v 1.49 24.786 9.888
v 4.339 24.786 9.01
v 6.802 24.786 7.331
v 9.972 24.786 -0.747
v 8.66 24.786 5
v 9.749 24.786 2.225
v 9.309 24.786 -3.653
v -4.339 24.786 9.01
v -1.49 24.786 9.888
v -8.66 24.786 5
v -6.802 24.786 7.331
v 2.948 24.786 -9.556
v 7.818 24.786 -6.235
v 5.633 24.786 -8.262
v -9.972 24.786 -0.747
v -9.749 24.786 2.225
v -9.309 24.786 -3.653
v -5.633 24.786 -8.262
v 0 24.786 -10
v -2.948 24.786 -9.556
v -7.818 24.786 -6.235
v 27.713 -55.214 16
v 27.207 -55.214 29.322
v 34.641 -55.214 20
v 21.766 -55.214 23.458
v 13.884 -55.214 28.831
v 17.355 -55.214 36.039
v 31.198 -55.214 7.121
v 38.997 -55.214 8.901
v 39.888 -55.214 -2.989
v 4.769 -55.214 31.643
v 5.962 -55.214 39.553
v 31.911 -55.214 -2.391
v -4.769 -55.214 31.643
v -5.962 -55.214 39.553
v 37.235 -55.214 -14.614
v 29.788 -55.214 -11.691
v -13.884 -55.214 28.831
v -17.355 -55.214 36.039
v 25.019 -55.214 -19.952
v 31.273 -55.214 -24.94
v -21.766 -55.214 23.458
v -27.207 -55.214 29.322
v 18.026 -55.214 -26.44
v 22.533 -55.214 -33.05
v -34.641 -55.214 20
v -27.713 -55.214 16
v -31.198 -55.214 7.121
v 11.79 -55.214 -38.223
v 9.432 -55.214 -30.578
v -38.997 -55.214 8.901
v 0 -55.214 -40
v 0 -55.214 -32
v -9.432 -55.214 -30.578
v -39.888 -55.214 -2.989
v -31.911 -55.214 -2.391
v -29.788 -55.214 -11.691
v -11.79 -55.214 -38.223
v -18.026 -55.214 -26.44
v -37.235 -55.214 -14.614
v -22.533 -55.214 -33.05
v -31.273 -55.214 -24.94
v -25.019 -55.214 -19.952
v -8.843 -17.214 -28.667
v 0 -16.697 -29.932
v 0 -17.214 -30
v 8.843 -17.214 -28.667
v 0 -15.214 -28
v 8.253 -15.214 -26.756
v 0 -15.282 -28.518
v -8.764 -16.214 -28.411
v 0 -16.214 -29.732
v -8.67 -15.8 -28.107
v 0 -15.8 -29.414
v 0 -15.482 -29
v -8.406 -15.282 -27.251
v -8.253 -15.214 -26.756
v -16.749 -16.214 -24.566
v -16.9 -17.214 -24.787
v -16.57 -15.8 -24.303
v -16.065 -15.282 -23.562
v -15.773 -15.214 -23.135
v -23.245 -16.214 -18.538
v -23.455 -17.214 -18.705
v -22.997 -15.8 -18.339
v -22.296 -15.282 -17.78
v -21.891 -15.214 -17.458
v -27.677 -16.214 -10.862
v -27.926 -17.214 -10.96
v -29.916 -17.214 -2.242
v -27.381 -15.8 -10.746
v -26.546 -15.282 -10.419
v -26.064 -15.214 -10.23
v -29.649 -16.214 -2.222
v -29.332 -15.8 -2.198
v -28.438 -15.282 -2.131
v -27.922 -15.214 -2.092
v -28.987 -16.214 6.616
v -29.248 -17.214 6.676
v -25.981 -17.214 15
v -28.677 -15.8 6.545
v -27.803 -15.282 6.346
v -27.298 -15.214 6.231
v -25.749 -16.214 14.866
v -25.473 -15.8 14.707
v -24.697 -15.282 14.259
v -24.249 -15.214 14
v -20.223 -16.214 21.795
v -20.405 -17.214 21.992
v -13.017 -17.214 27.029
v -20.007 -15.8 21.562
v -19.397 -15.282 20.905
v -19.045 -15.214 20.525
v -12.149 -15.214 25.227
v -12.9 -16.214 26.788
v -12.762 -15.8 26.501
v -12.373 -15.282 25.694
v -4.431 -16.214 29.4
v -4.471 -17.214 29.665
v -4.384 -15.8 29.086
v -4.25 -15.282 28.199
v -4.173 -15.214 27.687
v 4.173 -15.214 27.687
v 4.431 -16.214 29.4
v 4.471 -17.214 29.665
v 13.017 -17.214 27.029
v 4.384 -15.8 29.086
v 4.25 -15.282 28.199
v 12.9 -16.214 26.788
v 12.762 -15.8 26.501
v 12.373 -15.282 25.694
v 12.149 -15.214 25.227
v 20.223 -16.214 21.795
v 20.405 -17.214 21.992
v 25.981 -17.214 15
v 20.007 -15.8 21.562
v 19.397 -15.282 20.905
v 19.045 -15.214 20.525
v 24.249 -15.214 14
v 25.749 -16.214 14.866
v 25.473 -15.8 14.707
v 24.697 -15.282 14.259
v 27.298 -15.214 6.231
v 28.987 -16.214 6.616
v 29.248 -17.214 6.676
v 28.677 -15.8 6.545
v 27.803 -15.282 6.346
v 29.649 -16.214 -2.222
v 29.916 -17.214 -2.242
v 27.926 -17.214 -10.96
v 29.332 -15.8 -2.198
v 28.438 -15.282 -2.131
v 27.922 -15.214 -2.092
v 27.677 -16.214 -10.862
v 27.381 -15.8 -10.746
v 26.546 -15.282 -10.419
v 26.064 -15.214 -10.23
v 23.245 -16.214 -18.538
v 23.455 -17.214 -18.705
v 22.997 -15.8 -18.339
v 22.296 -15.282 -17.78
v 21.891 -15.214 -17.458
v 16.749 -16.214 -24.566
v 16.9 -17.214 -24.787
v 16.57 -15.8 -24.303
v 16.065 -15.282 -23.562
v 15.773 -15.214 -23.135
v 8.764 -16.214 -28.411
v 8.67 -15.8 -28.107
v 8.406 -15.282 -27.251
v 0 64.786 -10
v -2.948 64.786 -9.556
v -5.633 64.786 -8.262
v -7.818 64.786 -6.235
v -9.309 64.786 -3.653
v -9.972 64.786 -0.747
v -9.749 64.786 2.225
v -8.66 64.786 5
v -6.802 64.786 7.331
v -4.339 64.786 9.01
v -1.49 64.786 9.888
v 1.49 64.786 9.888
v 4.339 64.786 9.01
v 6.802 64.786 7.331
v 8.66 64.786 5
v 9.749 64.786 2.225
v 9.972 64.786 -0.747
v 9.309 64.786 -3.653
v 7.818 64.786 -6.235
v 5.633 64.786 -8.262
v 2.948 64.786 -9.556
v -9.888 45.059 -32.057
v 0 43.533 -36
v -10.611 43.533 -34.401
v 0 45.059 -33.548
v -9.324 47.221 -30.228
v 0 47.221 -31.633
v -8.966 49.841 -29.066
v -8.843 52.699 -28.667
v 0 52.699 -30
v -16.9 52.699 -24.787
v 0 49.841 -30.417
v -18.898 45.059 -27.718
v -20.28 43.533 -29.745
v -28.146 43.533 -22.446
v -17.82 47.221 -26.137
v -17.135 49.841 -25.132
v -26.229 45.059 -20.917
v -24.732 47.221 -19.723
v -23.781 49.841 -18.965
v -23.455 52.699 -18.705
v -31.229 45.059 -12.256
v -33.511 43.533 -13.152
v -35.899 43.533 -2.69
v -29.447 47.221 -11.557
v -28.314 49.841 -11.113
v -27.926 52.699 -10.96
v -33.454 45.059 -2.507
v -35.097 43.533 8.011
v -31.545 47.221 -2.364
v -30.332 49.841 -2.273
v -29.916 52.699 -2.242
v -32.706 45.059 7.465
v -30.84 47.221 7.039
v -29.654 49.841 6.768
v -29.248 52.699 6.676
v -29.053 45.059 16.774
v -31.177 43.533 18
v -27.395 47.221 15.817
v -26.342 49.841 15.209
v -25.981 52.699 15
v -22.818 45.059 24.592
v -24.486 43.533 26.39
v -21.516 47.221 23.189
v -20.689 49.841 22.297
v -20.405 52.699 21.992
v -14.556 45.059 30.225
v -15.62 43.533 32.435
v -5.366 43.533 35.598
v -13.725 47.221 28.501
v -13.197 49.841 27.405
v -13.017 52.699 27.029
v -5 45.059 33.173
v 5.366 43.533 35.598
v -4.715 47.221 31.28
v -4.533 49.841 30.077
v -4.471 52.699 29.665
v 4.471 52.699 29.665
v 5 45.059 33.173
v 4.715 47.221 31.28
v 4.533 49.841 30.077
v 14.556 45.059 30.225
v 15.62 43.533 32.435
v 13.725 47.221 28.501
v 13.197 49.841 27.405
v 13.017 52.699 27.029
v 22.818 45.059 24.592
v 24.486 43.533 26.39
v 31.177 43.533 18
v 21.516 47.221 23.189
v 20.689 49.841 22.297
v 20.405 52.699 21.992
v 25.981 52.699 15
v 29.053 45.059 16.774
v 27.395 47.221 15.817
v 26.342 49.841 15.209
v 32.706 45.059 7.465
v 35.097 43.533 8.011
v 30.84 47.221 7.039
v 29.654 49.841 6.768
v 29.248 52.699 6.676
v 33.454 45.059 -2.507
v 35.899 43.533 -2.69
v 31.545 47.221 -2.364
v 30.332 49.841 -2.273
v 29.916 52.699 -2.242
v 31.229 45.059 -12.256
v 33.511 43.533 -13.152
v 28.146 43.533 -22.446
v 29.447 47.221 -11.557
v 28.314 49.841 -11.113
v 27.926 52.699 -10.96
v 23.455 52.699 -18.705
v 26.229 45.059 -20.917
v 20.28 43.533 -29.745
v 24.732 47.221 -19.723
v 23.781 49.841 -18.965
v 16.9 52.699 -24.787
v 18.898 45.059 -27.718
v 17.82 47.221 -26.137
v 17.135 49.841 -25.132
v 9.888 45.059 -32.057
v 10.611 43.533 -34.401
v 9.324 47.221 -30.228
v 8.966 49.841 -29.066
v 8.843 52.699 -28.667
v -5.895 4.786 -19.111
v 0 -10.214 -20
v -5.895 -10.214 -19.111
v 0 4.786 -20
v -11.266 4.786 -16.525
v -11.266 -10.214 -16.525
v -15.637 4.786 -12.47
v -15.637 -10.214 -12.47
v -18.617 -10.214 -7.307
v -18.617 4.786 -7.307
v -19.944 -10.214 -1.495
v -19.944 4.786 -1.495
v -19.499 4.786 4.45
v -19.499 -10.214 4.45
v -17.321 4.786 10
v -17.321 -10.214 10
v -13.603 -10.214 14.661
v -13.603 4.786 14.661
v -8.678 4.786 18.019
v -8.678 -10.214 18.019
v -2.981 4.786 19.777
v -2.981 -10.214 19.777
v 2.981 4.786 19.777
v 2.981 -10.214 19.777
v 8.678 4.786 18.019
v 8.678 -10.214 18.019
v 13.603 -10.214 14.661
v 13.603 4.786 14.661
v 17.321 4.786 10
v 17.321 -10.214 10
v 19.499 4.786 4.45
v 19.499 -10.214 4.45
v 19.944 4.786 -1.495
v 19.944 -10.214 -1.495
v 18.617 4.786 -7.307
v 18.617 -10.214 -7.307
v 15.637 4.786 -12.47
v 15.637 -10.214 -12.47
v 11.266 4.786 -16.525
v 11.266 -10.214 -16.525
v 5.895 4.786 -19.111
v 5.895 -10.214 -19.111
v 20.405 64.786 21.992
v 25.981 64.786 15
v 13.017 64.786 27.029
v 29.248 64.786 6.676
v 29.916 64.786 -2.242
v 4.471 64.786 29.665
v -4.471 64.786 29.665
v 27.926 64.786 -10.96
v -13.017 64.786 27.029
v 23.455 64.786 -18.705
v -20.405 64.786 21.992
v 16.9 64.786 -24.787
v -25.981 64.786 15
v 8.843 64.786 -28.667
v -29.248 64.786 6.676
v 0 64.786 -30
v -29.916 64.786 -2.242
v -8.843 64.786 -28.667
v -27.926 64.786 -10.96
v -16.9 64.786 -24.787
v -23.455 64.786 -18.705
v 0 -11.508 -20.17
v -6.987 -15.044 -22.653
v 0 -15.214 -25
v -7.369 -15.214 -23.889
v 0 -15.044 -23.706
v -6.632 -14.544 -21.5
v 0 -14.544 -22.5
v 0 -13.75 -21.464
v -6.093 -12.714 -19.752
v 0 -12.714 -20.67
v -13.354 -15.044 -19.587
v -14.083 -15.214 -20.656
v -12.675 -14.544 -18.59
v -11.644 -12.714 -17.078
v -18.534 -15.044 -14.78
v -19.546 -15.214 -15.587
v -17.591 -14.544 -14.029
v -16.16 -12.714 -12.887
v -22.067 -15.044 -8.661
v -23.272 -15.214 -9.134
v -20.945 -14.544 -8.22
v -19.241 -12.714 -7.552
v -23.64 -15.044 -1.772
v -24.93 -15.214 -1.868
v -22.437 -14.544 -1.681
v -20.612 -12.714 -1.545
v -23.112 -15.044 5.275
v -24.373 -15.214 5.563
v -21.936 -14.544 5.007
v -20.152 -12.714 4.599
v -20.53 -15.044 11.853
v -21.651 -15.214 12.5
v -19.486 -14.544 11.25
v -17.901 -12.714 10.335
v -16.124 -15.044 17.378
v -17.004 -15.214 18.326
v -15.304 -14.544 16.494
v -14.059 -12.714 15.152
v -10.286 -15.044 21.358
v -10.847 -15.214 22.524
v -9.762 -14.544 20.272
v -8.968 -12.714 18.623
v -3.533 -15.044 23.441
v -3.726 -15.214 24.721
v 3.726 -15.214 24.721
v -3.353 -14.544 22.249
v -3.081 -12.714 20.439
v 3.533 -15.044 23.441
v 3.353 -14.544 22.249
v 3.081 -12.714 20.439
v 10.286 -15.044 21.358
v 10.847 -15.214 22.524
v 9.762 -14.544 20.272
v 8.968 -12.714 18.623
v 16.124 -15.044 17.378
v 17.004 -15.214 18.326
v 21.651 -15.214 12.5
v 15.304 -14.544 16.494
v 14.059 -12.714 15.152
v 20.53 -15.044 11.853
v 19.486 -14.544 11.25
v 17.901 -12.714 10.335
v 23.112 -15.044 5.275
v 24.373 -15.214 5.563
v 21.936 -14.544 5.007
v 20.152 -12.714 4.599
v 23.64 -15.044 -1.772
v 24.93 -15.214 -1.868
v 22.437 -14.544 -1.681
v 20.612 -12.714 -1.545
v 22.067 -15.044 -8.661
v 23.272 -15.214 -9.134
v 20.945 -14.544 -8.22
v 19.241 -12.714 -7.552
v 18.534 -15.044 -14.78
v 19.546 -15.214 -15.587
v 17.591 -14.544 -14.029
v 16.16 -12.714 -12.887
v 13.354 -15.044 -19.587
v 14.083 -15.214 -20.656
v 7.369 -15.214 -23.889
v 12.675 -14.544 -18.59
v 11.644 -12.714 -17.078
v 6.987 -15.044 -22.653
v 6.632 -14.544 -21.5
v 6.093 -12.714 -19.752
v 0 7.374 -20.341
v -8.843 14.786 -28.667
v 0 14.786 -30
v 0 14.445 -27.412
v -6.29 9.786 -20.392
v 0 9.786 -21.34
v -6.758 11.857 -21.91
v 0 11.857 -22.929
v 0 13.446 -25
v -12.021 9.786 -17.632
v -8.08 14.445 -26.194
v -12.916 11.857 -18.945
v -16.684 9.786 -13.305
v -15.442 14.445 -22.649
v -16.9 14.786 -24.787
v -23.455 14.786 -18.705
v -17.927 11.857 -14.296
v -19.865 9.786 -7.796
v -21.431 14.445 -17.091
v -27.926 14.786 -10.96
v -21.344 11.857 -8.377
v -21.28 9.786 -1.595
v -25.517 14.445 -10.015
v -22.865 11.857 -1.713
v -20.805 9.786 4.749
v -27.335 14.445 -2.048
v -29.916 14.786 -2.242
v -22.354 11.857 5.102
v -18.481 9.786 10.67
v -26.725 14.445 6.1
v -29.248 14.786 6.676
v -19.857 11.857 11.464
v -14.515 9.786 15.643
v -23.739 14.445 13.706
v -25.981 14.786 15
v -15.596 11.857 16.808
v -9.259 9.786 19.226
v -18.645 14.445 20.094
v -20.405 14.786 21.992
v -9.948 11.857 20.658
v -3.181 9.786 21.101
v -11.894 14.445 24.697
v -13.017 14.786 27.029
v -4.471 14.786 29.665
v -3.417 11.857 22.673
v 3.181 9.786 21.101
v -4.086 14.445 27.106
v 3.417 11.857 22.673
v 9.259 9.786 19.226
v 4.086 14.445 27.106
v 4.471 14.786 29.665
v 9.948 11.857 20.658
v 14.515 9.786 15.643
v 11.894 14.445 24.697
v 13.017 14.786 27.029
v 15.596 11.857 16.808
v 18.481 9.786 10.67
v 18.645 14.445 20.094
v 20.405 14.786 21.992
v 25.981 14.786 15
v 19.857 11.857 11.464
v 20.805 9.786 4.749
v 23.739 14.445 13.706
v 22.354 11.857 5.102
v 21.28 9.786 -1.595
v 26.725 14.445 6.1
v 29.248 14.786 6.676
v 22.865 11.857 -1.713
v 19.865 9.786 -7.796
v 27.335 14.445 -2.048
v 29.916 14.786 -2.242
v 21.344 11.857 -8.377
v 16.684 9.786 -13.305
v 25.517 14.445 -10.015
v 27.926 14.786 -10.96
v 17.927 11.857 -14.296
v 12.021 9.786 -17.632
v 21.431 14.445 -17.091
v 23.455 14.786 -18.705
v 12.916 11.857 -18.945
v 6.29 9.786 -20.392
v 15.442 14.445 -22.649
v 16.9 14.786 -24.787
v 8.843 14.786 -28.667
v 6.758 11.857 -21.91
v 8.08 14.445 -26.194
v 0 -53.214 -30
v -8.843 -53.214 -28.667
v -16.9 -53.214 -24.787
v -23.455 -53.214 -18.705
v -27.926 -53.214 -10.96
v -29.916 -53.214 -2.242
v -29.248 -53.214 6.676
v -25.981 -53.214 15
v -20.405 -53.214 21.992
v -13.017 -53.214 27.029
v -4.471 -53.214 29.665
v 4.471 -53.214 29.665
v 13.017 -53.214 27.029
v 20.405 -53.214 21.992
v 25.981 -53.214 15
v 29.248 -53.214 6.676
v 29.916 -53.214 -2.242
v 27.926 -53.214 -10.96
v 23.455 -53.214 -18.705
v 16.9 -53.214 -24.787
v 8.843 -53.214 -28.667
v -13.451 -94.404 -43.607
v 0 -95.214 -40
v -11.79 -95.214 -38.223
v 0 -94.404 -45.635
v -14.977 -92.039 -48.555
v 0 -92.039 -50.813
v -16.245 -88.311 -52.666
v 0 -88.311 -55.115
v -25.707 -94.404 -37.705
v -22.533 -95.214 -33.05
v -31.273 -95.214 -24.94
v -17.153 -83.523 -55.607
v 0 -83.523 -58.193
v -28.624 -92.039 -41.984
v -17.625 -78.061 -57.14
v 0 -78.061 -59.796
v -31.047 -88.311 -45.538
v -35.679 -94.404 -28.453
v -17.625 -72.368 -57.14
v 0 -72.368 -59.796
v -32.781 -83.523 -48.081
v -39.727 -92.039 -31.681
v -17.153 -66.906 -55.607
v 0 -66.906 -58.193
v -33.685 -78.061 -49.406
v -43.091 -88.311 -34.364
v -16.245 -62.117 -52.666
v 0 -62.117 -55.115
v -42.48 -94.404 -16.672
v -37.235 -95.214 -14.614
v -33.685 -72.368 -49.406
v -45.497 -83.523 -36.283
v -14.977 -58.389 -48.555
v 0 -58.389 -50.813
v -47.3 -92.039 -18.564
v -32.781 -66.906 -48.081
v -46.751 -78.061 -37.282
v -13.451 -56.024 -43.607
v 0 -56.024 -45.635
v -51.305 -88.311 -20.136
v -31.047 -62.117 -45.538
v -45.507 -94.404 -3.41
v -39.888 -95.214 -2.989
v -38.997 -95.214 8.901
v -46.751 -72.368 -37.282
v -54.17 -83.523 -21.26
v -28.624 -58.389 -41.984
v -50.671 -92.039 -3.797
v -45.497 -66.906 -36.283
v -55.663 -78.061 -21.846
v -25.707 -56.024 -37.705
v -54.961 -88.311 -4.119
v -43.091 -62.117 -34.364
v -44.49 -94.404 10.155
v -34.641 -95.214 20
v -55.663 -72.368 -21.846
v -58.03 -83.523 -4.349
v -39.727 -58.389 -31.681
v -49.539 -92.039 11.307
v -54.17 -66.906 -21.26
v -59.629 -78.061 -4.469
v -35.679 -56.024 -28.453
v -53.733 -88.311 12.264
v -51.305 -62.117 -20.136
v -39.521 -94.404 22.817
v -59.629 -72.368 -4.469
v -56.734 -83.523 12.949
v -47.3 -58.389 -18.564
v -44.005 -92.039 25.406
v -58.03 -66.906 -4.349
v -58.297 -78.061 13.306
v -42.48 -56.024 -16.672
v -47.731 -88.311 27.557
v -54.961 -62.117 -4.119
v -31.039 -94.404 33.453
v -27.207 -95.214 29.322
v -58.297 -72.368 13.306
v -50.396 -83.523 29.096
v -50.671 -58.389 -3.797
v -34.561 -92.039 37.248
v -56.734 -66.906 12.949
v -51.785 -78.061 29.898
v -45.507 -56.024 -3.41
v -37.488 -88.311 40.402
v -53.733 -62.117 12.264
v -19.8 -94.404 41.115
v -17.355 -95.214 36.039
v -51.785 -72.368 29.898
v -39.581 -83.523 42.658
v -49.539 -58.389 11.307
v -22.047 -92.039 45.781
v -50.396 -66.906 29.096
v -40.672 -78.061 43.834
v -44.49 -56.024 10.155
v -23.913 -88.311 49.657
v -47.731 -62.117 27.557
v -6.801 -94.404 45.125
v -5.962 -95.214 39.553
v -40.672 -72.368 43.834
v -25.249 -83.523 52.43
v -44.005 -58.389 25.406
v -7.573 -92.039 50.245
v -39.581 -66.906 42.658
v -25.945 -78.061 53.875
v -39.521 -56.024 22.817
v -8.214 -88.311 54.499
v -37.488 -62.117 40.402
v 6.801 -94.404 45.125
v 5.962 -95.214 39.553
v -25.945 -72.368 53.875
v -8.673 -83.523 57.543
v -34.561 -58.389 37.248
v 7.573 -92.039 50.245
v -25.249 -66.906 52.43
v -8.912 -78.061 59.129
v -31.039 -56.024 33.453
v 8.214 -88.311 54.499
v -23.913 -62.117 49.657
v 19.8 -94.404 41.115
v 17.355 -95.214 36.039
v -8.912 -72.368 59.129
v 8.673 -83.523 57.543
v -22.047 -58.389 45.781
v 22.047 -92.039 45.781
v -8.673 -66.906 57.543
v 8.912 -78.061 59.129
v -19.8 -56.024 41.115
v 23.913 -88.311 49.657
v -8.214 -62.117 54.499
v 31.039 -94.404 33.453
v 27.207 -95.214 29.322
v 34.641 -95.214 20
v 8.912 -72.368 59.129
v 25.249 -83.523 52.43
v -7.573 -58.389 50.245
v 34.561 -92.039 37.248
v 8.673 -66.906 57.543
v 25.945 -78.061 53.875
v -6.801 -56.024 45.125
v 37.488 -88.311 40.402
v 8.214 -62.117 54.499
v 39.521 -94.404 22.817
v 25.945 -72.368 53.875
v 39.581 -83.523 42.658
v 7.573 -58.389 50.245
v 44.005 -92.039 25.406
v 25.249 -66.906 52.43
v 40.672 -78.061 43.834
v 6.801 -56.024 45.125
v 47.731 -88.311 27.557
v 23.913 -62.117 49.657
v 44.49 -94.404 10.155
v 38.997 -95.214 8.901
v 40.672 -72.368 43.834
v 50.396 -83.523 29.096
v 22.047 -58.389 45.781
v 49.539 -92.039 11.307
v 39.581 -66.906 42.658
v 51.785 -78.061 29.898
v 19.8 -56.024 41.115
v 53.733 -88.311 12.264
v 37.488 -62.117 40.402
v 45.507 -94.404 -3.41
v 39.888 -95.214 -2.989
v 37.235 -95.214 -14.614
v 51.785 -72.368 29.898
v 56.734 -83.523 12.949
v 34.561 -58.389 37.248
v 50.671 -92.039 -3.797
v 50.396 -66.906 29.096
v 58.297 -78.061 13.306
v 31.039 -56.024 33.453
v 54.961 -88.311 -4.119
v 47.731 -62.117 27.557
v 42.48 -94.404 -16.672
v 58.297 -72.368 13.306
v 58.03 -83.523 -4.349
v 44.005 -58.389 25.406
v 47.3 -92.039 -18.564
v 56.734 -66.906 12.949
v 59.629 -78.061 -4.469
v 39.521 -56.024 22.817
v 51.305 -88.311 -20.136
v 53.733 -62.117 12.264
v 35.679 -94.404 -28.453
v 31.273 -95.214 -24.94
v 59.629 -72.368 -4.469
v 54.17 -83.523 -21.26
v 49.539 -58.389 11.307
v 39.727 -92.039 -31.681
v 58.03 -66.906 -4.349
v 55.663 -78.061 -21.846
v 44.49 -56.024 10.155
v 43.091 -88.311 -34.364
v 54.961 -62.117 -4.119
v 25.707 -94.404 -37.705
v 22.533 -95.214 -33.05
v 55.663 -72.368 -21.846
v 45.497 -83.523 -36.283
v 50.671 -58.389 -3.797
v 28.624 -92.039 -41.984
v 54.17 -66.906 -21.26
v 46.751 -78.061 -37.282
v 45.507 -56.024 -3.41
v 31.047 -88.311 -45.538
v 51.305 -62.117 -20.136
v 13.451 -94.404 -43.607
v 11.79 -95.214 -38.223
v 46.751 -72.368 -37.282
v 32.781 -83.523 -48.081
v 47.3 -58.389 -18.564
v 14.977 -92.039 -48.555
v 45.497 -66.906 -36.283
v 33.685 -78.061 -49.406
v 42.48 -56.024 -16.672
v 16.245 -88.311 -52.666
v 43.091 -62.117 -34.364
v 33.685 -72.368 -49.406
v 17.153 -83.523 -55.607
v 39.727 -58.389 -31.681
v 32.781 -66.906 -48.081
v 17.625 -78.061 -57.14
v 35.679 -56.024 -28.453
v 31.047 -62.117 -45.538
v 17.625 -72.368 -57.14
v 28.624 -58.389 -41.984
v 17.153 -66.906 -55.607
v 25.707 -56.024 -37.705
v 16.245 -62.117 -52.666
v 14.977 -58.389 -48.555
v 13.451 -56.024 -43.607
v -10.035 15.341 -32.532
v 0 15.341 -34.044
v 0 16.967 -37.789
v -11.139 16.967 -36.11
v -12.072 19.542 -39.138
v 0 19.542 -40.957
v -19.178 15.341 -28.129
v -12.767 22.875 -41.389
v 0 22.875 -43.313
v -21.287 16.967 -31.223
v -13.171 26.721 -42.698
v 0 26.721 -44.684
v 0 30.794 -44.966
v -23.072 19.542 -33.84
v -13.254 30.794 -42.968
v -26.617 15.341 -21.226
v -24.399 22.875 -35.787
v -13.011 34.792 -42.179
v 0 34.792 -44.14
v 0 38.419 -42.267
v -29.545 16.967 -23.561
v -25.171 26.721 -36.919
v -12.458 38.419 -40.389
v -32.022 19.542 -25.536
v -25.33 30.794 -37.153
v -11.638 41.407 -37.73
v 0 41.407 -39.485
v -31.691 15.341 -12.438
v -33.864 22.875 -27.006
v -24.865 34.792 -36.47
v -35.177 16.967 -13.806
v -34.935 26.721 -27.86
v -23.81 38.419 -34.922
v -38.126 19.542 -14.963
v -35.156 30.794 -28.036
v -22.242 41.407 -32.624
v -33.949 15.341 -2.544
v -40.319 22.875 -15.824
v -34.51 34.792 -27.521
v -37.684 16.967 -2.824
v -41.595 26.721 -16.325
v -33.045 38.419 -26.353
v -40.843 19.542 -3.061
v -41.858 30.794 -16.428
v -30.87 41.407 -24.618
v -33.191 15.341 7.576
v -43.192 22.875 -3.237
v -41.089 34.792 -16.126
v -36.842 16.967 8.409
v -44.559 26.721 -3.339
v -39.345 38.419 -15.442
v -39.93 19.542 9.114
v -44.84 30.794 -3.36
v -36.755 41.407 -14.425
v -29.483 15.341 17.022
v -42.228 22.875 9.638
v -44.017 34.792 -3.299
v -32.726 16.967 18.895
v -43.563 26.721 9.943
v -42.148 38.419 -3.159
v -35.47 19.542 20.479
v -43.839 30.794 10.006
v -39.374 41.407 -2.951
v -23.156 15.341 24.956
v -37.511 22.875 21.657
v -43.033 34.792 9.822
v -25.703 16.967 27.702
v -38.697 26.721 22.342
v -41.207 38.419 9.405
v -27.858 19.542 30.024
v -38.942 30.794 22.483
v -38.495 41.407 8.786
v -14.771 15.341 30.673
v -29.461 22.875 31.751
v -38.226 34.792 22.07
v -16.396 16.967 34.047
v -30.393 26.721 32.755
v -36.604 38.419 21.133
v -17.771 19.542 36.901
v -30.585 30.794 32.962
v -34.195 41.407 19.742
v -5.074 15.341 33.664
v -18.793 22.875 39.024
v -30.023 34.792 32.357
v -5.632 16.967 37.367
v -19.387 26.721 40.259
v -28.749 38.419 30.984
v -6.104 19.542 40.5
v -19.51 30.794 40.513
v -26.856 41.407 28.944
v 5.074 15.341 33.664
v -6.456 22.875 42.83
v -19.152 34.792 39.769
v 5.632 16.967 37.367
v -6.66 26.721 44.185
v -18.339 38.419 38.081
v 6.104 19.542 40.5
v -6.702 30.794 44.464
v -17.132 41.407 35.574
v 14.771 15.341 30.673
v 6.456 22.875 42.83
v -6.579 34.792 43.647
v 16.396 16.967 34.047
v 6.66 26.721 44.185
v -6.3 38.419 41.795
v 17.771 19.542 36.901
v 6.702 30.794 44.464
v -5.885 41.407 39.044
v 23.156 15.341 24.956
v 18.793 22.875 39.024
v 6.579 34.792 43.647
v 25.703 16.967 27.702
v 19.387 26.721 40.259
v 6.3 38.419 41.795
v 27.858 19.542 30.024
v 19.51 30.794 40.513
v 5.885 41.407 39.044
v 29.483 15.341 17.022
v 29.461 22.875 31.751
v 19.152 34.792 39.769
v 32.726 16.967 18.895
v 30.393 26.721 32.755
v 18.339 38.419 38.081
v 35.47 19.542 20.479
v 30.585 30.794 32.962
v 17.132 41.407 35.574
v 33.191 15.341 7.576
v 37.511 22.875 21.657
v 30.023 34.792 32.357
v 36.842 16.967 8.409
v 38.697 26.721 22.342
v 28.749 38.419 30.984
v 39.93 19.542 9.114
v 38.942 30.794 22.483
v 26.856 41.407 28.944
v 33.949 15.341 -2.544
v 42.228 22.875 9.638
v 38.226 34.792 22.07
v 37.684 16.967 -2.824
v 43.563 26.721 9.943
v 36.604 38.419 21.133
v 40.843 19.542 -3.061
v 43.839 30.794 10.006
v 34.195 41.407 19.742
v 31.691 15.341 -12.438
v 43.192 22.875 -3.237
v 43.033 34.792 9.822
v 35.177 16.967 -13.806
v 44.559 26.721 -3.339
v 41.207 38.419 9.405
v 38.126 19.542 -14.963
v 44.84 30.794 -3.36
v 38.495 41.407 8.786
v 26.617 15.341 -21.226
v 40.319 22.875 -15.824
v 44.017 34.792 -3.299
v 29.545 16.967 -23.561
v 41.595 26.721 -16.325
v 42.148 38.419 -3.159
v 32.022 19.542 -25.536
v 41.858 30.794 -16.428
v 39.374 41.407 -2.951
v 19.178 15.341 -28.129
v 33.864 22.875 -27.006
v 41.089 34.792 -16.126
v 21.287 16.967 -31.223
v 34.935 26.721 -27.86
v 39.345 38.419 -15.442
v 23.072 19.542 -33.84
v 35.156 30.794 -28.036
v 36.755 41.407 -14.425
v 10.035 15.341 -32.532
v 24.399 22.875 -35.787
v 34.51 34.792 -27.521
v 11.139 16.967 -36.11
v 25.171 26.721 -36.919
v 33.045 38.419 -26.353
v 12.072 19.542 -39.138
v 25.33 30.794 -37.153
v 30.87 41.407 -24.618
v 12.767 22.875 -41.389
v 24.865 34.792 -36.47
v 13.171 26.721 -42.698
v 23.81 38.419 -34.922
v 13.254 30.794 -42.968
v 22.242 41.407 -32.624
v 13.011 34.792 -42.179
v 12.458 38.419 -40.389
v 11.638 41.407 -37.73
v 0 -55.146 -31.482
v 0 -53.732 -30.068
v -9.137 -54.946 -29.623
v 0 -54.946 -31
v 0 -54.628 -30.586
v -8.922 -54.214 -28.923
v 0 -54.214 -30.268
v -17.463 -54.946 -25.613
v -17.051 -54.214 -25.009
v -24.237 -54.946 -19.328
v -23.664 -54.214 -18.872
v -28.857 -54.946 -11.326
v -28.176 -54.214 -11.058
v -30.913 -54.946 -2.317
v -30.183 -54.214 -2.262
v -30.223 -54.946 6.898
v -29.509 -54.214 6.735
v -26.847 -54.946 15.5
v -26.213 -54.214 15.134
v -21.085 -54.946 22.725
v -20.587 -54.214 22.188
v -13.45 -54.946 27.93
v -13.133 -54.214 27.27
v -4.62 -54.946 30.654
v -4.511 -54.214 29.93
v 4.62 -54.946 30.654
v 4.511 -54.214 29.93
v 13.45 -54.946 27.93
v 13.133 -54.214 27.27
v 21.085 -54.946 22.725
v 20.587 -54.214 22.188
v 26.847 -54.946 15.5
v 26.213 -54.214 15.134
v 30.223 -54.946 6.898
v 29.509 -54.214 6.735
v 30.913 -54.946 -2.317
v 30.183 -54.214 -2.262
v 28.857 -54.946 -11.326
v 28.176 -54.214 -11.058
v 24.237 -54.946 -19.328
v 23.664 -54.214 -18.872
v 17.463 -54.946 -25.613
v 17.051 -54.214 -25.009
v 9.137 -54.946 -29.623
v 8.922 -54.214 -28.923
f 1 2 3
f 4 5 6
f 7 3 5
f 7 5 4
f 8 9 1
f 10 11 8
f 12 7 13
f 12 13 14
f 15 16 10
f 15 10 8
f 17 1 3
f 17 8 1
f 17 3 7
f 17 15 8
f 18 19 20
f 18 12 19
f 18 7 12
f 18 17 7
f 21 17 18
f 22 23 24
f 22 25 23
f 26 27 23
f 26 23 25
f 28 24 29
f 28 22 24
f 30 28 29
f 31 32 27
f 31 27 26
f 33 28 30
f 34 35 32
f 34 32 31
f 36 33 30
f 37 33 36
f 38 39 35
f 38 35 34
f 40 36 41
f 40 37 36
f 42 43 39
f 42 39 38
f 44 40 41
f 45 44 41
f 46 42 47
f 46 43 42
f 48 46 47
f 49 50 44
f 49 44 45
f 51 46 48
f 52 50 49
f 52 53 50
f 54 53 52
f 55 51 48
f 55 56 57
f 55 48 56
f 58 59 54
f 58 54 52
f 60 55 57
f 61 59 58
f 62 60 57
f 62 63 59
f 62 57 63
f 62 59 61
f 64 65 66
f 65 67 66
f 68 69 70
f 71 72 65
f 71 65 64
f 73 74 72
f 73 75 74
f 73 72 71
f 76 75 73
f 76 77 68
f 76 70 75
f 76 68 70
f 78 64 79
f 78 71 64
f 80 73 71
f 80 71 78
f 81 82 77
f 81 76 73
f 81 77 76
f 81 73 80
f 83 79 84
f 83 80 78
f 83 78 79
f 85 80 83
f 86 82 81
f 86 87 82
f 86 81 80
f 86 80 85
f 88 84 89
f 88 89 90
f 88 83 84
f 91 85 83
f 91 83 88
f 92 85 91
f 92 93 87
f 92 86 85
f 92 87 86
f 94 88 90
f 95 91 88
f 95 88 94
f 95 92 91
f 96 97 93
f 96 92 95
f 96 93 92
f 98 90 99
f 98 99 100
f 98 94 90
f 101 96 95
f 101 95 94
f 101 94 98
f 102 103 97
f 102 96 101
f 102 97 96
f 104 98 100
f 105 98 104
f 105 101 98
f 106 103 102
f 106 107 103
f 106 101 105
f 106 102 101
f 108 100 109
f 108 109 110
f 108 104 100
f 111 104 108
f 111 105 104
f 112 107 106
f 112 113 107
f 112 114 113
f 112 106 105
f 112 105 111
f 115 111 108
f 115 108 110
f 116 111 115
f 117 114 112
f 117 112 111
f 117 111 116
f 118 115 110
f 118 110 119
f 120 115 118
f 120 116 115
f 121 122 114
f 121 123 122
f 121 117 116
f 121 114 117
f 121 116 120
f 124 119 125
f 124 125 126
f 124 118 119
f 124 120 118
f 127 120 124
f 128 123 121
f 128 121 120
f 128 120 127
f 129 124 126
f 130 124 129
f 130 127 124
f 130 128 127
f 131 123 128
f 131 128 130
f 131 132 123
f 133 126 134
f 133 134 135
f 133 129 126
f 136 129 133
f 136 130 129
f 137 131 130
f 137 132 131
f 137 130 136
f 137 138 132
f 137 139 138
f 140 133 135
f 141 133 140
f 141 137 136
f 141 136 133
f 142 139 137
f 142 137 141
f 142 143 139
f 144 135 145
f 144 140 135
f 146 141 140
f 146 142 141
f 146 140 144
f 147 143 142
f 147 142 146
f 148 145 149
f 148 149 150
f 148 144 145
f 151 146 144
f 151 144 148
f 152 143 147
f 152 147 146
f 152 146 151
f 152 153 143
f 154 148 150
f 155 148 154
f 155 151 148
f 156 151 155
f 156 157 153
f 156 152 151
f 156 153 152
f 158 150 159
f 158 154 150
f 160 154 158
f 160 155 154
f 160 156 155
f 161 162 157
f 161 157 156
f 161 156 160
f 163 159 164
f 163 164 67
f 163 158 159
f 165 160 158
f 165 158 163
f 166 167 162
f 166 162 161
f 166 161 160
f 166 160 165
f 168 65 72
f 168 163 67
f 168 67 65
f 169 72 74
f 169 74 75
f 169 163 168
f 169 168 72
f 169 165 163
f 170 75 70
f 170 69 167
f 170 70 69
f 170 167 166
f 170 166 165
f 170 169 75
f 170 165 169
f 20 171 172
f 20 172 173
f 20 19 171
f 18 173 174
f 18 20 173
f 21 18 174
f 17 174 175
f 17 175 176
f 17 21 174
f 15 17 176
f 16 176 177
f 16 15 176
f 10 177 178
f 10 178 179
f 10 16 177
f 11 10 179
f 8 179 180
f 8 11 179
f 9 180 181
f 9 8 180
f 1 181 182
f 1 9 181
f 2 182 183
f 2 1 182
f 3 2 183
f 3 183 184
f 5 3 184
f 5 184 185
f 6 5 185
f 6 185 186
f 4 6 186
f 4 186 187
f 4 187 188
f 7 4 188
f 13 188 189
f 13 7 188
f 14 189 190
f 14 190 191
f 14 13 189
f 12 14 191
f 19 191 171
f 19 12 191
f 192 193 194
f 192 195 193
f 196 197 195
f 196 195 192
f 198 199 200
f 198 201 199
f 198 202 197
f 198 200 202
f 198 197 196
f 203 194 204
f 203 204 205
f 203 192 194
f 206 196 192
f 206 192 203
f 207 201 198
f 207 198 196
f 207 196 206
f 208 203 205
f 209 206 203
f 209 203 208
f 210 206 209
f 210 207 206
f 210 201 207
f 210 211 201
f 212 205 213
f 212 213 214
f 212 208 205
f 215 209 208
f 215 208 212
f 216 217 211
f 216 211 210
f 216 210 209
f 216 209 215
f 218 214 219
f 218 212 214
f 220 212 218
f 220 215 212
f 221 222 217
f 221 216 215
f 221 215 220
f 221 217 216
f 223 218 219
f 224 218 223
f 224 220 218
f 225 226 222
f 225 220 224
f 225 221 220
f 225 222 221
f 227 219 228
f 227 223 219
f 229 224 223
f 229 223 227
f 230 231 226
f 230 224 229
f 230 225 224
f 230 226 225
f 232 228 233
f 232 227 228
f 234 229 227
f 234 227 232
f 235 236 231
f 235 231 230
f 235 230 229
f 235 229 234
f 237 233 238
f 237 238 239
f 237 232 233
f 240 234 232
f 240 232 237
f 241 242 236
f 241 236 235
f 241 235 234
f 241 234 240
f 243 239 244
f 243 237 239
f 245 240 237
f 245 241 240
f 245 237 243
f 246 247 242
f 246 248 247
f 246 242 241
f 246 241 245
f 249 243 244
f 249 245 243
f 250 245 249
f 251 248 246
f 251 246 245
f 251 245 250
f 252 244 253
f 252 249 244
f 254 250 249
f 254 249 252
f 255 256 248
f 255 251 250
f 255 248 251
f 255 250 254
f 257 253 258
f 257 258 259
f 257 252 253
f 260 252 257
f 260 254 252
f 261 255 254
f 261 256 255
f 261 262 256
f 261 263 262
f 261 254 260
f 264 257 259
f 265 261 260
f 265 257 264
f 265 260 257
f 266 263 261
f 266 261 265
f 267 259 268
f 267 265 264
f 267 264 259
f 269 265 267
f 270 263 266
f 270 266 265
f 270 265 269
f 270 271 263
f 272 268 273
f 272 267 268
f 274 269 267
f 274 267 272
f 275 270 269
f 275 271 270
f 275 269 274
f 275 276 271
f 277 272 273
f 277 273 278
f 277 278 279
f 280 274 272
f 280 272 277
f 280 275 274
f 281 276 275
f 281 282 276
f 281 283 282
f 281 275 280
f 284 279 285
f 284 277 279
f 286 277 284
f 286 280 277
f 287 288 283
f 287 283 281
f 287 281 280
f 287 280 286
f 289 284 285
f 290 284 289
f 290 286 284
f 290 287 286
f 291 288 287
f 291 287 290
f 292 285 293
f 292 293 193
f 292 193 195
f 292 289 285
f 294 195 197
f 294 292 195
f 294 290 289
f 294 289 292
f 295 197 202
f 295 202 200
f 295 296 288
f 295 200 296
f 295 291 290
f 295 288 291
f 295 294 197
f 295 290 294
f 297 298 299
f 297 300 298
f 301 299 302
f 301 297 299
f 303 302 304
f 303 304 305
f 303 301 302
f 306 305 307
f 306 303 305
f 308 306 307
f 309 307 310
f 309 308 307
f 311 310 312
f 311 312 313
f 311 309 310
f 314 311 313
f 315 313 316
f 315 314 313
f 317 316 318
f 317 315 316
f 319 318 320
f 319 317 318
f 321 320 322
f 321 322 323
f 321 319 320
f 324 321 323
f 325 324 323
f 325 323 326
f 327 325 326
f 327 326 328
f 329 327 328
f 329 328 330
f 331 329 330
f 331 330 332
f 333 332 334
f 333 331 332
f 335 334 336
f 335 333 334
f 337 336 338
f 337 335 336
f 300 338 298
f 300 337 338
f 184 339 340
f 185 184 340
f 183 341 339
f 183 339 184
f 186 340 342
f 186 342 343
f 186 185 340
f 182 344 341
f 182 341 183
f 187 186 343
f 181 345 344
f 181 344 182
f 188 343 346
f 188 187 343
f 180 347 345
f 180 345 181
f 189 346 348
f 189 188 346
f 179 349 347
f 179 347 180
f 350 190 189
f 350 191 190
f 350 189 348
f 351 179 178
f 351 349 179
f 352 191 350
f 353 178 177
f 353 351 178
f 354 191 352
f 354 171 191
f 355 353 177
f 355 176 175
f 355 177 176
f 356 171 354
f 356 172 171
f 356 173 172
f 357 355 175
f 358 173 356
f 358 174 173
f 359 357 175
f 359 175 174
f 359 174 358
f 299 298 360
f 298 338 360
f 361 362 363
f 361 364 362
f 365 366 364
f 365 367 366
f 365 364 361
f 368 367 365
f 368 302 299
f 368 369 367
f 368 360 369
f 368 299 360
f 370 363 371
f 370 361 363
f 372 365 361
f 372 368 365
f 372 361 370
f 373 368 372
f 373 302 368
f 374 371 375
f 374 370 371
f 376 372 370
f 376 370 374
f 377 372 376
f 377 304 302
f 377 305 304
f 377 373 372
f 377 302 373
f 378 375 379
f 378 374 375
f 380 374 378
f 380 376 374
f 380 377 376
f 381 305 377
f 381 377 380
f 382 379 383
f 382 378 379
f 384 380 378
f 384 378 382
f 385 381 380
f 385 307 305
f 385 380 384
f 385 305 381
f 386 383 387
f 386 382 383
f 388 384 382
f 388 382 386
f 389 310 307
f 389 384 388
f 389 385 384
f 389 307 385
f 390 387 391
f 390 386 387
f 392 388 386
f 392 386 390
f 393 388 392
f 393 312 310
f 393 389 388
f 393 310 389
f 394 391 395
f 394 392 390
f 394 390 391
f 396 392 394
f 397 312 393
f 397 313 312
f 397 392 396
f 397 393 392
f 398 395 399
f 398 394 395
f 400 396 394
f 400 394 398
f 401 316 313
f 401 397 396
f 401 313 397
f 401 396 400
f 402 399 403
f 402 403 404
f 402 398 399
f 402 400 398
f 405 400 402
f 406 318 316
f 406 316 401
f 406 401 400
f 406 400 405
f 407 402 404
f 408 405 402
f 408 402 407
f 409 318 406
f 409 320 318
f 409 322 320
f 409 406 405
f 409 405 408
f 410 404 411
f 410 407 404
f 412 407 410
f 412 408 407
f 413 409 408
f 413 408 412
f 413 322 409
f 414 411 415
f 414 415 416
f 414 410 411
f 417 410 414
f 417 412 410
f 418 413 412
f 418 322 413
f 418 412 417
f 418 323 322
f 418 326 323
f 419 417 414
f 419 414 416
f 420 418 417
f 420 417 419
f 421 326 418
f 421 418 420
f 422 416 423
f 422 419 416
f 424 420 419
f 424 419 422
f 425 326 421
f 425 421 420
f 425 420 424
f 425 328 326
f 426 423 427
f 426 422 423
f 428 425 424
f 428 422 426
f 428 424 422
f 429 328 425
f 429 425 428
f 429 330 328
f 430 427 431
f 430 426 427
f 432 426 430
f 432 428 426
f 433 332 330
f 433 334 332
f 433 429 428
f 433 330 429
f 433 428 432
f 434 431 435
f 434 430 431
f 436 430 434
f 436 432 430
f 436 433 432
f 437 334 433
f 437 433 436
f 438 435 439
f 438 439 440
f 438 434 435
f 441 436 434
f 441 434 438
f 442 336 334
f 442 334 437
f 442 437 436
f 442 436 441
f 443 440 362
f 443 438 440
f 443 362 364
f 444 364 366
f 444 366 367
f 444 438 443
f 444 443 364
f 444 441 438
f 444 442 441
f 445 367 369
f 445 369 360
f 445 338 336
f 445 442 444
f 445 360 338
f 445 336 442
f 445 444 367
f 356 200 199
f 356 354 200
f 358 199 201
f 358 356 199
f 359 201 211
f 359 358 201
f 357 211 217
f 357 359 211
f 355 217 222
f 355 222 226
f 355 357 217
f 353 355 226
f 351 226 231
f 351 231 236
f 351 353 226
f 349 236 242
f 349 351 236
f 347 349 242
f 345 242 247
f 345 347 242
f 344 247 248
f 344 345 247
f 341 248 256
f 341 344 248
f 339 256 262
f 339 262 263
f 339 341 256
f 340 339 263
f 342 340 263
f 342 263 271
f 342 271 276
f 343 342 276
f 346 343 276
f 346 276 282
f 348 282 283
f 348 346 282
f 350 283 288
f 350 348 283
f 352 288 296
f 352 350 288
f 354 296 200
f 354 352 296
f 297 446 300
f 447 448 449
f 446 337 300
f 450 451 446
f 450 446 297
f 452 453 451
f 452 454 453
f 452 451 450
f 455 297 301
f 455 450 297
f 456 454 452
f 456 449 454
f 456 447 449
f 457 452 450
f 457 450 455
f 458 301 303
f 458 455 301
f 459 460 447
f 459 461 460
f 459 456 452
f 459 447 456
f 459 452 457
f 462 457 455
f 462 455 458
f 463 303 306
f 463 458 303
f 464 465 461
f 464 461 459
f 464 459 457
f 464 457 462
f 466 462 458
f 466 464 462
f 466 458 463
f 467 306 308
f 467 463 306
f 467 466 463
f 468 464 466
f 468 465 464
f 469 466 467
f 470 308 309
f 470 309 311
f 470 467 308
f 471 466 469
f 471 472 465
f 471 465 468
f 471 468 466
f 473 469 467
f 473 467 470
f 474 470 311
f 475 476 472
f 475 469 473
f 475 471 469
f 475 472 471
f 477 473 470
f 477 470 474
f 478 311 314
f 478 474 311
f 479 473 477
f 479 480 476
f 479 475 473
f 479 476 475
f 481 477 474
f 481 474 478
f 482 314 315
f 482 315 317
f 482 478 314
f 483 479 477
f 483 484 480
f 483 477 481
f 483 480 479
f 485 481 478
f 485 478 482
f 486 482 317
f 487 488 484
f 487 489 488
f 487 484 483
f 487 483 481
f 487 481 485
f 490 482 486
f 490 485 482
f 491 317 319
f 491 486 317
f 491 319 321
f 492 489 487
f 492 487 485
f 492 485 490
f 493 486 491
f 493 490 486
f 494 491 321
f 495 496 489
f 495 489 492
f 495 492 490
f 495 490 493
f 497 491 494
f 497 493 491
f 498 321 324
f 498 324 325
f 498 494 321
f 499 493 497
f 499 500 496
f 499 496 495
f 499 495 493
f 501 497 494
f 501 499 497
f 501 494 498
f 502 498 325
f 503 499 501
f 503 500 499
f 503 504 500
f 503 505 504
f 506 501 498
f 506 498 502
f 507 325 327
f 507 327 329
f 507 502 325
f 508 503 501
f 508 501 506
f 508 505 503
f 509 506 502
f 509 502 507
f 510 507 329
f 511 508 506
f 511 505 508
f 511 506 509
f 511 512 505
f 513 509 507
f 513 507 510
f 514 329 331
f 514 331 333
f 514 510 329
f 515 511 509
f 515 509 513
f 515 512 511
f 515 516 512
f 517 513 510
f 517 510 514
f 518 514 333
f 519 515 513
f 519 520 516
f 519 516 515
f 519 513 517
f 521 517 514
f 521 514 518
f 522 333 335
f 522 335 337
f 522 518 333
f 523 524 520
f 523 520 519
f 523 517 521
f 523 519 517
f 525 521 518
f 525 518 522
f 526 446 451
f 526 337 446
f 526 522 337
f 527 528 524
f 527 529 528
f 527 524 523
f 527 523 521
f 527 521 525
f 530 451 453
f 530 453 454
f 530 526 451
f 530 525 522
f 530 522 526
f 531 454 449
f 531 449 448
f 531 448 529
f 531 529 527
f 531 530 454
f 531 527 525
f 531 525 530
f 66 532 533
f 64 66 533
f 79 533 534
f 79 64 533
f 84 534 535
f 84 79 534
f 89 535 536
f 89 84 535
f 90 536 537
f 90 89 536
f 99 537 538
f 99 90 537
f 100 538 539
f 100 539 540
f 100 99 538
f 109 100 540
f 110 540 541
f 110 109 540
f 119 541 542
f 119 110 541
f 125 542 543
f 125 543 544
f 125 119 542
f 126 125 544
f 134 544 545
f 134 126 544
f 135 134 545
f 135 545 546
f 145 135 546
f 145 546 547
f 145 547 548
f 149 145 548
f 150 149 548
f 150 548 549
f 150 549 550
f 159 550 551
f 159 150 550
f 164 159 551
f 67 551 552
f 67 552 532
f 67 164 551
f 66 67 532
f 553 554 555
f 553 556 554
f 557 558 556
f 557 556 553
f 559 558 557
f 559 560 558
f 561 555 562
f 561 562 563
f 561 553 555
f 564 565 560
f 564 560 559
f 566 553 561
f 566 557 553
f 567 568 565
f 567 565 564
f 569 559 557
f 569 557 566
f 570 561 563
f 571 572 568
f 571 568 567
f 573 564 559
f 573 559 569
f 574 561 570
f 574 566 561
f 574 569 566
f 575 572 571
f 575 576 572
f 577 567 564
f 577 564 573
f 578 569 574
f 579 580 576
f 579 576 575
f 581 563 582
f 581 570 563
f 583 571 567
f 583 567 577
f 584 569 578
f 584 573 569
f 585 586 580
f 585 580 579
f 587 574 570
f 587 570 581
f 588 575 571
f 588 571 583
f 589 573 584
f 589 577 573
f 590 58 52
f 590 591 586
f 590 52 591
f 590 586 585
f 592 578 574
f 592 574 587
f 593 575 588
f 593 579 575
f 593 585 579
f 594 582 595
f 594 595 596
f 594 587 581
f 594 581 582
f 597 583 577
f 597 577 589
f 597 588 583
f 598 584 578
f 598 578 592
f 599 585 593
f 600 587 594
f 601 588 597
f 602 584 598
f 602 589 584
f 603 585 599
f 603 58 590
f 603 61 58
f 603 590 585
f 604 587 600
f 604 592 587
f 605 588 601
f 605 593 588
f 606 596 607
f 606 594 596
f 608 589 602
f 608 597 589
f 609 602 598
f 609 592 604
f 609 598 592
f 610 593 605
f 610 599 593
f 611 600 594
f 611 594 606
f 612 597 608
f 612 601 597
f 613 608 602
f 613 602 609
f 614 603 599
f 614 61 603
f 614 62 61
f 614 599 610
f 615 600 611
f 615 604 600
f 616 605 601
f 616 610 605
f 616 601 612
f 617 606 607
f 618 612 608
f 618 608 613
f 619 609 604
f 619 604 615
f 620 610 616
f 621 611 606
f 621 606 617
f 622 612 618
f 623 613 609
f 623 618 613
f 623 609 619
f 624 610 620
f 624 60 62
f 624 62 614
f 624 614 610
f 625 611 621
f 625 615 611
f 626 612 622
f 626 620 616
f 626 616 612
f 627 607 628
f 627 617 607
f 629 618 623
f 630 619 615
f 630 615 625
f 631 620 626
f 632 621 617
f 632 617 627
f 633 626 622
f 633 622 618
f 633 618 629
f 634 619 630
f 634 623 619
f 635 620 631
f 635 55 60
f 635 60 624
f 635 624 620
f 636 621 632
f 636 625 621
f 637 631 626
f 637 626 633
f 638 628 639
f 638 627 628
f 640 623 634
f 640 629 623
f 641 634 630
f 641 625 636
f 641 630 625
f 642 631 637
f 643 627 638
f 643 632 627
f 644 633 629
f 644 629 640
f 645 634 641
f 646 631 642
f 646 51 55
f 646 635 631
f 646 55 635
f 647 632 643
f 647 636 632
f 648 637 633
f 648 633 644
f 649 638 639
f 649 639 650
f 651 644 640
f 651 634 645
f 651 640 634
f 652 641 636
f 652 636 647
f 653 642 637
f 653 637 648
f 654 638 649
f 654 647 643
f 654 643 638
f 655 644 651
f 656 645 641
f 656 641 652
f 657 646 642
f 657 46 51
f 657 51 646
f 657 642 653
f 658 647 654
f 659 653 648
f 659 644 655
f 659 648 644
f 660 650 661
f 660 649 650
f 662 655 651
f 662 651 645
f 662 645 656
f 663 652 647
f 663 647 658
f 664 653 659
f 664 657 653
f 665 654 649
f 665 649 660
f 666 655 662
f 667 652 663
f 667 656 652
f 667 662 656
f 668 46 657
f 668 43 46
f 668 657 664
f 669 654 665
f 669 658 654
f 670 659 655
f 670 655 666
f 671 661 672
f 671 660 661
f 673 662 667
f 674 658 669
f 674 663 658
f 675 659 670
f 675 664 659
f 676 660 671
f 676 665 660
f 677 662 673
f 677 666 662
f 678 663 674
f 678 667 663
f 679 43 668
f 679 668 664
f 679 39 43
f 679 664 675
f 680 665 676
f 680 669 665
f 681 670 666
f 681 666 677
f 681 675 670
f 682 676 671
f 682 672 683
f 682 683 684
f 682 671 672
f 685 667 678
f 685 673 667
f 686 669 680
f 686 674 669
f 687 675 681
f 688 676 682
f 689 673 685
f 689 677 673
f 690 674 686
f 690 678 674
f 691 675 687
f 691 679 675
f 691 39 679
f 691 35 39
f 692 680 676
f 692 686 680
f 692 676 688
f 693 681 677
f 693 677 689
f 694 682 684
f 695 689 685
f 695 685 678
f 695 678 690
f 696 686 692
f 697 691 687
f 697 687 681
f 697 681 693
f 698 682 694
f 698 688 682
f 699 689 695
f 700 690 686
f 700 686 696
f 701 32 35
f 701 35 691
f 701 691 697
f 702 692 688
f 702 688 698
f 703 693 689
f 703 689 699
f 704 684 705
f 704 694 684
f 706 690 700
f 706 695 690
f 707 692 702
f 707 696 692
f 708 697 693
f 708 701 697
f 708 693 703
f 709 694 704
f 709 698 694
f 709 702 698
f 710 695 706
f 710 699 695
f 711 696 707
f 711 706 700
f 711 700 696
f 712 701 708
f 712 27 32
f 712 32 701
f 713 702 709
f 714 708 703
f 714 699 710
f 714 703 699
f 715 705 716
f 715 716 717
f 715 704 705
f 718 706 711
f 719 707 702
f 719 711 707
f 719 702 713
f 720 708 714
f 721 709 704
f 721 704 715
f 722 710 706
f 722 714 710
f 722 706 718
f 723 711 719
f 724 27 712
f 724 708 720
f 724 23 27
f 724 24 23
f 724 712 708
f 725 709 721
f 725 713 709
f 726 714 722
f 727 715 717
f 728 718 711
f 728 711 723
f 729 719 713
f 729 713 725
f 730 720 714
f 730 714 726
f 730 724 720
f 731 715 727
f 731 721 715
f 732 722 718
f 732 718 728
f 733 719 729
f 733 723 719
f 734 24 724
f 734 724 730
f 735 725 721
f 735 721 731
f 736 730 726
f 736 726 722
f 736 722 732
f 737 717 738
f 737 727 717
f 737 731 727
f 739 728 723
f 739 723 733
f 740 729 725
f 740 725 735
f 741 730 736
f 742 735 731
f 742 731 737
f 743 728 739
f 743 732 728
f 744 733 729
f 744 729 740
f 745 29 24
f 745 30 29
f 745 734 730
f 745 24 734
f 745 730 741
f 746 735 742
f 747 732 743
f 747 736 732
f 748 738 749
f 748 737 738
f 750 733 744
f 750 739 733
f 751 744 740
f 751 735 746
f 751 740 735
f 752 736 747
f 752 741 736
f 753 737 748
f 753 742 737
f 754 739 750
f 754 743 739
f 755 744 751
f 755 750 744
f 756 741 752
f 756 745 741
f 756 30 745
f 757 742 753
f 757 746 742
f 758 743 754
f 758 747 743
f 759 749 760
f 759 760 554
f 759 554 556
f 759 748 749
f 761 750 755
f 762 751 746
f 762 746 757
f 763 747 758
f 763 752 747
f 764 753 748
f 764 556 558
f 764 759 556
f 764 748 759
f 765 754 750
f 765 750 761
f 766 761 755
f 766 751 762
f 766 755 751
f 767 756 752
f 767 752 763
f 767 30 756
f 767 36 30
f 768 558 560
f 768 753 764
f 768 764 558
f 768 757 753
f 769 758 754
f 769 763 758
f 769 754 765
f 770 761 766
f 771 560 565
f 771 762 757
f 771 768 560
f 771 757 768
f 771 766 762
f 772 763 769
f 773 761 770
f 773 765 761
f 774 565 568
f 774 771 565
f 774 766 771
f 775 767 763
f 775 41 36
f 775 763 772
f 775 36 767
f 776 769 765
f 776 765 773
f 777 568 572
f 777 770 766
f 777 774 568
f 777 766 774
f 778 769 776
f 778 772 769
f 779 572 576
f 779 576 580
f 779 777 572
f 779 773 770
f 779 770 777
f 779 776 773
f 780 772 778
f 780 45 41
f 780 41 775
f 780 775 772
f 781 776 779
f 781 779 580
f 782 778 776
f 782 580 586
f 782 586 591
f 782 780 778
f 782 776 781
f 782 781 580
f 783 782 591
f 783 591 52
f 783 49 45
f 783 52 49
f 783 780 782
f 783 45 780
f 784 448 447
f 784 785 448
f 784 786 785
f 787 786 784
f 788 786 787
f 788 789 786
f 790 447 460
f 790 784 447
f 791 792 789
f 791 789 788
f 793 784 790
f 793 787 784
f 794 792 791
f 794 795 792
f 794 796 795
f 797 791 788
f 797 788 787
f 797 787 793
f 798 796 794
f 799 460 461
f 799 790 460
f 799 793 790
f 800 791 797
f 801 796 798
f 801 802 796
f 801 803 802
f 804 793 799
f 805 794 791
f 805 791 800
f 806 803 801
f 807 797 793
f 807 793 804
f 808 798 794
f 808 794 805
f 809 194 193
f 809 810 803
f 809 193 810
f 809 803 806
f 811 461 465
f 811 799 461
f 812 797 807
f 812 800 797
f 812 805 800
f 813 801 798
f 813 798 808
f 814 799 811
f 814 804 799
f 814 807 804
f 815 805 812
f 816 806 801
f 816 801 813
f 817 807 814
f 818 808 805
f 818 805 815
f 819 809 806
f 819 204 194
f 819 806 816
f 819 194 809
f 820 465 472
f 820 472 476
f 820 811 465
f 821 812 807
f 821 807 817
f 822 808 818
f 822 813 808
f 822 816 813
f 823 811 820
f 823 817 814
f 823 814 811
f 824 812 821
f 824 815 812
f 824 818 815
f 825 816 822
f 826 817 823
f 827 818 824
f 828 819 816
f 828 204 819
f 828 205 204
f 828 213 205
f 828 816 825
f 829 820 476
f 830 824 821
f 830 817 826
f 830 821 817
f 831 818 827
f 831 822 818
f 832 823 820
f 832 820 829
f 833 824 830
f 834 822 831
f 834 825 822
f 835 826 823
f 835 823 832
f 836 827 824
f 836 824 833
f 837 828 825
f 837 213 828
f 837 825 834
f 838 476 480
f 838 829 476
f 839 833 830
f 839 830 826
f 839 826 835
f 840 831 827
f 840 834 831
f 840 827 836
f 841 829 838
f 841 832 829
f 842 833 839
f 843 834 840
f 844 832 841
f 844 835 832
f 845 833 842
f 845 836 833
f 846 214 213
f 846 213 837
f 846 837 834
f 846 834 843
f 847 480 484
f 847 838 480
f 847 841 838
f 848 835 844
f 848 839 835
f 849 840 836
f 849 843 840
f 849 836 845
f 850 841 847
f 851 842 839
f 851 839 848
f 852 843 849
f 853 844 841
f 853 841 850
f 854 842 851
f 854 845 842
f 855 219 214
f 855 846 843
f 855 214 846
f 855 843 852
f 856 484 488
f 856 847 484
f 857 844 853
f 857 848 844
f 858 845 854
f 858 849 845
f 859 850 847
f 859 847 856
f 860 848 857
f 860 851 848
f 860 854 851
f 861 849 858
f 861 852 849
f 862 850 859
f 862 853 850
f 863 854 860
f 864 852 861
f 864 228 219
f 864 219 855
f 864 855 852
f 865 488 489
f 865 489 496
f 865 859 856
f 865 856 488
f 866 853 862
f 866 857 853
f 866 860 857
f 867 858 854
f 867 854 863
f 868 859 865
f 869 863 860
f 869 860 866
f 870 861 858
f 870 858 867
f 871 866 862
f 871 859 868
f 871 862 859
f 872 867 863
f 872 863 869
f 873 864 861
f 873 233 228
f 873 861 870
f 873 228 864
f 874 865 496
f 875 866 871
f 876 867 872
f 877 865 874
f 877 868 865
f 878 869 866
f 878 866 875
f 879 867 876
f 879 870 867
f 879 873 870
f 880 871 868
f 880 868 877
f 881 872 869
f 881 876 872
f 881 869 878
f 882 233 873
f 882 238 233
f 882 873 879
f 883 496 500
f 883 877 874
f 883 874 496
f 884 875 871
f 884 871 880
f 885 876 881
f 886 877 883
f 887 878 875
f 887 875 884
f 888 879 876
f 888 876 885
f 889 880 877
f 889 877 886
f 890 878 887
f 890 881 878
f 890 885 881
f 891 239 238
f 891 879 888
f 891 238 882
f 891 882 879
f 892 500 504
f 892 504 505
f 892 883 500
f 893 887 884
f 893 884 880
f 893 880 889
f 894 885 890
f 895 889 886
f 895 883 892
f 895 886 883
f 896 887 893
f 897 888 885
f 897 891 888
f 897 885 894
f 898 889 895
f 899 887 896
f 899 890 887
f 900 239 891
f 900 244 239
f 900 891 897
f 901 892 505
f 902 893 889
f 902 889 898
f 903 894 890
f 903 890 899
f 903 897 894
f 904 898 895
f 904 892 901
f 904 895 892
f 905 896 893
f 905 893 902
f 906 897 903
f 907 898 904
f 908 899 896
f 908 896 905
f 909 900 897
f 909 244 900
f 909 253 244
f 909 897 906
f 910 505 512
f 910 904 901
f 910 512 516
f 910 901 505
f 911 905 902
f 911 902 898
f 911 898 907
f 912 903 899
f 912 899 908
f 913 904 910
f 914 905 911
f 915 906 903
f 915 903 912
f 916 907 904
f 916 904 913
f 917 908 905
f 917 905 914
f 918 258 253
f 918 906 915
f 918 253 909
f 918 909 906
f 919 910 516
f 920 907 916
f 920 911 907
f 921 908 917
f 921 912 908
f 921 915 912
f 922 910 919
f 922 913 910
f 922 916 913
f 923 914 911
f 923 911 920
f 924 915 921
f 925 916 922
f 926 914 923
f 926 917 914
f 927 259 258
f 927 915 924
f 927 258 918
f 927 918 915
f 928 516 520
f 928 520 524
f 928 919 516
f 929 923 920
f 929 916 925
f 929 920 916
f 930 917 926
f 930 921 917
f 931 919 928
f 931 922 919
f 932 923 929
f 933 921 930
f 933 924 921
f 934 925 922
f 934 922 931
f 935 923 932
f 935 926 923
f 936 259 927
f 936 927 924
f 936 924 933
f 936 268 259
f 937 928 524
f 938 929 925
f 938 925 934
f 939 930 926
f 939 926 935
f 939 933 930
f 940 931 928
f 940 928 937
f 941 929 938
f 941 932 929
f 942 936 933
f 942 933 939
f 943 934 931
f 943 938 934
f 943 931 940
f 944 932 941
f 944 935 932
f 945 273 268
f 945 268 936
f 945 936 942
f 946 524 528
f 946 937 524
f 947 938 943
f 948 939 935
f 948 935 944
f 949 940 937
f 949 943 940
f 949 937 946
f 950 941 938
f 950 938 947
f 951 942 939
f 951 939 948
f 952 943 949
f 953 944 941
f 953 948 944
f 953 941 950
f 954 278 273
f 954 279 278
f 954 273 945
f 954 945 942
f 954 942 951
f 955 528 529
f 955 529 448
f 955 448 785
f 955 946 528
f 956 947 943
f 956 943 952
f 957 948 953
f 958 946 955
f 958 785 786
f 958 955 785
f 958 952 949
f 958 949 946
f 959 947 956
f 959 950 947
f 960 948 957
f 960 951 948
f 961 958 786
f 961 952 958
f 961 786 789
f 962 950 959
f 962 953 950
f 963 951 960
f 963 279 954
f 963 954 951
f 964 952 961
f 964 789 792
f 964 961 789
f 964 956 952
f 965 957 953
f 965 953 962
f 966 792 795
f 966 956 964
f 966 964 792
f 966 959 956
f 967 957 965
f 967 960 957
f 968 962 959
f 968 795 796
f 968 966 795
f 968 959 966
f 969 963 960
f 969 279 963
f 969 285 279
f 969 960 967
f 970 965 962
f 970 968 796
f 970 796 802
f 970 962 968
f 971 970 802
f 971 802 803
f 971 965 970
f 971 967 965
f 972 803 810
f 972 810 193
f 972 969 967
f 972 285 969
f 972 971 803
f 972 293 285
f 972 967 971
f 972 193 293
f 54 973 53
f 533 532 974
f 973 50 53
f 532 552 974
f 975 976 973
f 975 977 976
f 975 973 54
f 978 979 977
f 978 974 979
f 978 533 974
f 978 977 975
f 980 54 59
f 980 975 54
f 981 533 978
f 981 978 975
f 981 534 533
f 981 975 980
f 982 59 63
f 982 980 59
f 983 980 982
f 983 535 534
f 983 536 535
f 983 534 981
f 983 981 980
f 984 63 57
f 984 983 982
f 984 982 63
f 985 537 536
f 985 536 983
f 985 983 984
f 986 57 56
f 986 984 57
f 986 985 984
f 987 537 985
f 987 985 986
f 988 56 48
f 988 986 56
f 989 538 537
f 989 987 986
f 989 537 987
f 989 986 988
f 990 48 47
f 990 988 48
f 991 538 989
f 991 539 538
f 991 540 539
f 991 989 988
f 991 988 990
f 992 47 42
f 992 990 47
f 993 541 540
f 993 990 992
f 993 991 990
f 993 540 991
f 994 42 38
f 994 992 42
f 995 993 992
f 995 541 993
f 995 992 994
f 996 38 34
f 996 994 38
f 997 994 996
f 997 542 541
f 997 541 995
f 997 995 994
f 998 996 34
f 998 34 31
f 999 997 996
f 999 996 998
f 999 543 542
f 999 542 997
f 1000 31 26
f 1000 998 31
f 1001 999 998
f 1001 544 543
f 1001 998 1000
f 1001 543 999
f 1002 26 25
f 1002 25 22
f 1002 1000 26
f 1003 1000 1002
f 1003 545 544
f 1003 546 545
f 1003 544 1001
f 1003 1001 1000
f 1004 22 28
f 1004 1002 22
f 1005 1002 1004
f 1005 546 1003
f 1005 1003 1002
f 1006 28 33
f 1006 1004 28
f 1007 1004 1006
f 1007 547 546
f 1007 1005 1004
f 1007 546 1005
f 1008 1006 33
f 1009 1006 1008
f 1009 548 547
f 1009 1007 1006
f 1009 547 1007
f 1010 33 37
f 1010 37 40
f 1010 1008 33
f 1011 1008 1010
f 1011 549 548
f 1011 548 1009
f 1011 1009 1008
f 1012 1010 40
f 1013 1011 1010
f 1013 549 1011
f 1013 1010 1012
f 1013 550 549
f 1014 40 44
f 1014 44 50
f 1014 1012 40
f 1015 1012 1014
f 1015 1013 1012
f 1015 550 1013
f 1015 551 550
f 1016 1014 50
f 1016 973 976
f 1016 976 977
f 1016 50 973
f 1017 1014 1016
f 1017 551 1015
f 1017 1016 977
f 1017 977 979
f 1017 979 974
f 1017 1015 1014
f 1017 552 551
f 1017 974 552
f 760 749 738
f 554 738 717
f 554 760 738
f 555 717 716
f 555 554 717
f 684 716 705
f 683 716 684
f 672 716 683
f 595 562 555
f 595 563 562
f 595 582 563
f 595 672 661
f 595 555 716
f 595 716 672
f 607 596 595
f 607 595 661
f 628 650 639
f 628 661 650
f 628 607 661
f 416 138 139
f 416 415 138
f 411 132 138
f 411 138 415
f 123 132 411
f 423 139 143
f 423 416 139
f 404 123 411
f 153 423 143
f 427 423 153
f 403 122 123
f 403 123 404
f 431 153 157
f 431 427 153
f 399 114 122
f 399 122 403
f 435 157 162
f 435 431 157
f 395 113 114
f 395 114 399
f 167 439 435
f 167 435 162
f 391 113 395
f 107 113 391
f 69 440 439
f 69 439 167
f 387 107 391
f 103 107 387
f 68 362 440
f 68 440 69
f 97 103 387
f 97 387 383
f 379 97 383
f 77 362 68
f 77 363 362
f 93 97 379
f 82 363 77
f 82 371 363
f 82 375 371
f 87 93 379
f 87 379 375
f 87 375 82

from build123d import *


with BuildPart() as part:
    # Sketch1 → Revolve1 (revolve)
    with BuildSketch(Plane.XY, mode=Mode.PRIVATE) as revolve1_sk:
        with BuildLine():
            Line((0, -95.214240608), (40, -95.214240608))
            ThreePointArc((40, -95.214240608), (60, -75.214240608), (40, -55.214240608))
            Line((40, -55.214240608), (32, -55.214240608))
            ThreePointArc((32, -55.214240608), (30.585786438, -54.62845417), (30, -53.214240608))
            Line((30, -53.214240608), (30, -17.214240608))
            ThreePointArc((30, -17.214240608), (29.414213562, -15.800027045), (28, -15.214240608))
            Line((28, -15.214240608), (25, -15.214240608))
            ThreePointArc((25, -15.214240608), (21.464466094, -13.749774514), (20, -10.214240608))
            Line((20, -10.214240608), (20, 4.785759392))
            ThreePointArc((20, 4.785759392), (22.928932188, 11.856827204), (30, 14.785759392))
            ThreePointArc((30, 14.785759392), (44.683594694, 26.721114737), (36, 43.533486477))
            ThreePointArc((36, 43.533486477), (31.633399735, 47.221412292), (30, 52.698637867))
            Line((30, 52.698637867), (30, 64.785759392))
            Line((30, 64.785759392), (10, 64.785759392))
            Line((10, 64.785759392), (10, 24.785759392))
            Line((10, 24.785759392), (0, 24.785759392))
            Line((0, 24.785759392), (0, -95.214240608))
        make_face()
    revolve(revolve1_sk.sketch.rotate(Axis((0, 0, 0), (0, 1, 0)), 90), axis=Axis((0, 0, 0), (0, 1, 0)))


solid = part.part
